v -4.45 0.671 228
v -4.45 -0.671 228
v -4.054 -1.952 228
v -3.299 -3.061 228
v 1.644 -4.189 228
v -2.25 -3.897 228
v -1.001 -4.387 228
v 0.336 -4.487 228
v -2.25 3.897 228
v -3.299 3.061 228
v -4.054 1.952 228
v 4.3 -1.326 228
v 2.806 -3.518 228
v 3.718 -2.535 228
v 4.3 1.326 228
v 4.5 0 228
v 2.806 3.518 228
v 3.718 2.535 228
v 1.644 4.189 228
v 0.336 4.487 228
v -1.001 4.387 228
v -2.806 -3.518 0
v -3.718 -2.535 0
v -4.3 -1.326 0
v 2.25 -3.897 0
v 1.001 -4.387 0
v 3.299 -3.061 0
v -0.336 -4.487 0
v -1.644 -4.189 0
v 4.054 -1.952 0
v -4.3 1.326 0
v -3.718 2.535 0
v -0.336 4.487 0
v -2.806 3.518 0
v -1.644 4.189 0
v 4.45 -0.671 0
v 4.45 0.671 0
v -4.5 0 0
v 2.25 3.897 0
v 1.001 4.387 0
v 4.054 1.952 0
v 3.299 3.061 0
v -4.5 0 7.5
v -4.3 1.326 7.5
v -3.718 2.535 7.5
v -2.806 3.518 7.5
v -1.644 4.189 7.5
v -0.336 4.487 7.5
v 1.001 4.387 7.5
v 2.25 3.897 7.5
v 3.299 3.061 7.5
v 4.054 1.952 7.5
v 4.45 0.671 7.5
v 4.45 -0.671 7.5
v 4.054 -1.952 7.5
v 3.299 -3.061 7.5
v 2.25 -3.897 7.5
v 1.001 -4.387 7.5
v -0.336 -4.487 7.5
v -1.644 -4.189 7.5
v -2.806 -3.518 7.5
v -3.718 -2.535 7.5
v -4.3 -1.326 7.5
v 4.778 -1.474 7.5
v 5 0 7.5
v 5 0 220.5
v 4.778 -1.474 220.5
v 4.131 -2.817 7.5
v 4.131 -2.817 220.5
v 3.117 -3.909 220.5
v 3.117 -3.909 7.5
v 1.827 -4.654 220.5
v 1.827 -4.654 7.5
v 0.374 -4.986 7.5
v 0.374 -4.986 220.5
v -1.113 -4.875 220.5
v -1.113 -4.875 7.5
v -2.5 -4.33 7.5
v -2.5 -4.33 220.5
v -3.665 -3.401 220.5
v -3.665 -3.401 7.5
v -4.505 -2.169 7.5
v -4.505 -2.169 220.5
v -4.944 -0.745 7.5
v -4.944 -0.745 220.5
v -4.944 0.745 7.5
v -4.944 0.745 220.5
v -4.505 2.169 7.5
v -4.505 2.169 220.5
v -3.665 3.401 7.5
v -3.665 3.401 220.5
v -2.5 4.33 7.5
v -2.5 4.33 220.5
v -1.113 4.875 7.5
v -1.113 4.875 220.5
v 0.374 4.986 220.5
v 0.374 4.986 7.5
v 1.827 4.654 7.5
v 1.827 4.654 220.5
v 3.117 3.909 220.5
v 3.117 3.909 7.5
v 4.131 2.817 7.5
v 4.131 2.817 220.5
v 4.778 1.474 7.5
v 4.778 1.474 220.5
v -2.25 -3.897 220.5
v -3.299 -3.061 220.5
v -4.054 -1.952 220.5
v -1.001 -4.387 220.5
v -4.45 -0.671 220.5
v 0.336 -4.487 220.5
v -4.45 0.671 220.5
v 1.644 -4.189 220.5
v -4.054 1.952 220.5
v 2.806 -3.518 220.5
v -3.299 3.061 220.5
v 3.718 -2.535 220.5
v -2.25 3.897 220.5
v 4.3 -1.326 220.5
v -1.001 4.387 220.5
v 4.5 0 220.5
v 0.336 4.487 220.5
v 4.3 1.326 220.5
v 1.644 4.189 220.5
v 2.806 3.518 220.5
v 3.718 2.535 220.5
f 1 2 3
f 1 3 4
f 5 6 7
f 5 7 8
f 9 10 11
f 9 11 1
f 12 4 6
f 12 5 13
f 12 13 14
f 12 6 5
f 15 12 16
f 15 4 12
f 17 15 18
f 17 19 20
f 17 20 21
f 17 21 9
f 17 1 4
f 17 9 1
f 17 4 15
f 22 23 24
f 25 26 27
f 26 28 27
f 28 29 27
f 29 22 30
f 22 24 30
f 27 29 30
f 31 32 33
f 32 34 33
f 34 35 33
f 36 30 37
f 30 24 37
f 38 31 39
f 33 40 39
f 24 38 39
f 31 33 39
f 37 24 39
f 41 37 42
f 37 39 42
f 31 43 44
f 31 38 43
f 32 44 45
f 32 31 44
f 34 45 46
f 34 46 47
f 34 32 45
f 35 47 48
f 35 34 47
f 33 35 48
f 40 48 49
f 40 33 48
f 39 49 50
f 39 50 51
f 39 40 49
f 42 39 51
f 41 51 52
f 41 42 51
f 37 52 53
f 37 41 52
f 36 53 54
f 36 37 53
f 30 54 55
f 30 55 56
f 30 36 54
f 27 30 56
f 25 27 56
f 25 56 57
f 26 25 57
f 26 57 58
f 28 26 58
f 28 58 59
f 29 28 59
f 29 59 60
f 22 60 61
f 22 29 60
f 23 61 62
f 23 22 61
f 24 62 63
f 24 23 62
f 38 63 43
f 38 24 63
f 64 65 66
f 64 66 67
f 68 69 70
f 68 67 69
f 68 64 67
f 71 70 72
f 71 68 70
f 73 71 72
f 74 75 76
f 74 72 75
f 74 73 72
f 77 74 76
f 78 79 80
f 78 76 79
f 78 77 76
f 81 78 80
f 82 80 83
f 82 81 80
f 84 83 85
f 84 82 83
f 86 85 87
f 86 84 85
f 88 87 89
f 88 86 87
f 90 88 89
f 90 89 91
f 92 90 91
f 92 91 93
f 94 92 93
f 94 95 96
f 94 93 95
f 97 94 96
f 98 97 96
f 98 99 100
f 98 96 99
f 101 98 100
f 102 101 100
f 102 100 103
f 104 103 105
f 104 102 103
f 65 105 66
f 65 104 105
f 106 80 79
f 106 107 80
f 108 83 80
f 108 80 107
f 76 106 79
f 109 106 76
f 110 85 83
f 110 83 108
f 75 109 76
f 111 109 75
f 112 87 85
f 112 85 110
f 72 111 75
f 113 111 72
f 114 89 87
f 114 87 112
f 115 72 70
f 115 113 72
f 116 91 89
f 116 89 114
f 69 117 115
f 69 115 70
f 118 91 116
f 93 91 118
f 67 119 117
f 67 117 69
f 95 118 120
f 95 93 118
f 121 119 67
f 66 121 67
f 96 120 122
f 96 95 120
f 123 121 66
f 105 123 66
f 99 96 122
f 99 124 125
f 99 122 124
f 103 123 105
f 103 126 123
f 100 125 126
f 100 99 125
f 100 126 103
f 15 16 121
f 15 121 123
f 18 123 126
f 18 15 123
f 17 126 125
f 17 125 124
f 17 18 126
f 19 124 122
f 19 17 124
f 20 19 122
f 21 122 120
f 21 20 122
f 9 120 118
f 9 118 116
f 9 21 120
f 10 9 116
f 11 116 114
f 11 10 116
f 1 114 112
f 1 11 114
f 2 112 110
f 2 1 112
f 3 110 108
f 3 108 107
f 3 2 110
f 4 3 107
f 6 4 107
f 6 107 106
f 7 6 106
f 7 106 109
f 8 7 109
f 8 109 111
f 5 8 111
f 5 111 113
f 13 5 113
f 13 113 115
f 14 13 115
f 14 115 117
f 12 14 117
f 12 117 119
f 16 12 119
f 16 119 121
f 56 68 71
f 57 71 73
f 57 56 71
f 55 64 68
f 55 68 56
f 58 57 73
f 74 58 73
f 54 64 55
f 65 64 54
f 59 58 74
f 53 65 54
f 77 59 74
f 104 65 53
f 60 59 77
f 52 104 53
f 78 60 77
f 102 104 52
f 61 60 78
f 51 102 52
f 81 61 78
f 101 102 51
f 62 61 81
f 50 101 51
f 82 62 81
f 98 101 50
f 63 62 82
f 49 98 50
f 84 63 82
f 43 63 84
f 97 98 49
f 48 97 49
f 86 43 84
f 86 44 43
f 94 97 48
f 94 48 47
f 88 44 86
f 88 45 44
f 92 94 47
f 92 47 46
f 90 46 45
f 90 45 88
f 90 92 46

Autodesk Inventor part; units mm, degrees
ref_plane "YZ Plane" through (0, 0, 0) normal (1, 0, 0) x (0, 1, 0)
ref_plane "XZ Plane" through (0, 0, 0) normal (0, 1, 0) x (-1, 0, 0)
ref_plane "XY Plane" through (0, 0, 0) normal (0, 0, 1) x (1, 0, 0)
sketch "Sketch2" plane through (0, 0, 0) normal (0, 0, 1) x (1, 0, 0)
  circle A0 centre (0, 0) radius 5
  dimension "d7" = 10
extrude "Extrusion2" add sketch "Sketch2" along normal blind 228
sketch "Sketch3" plane through (0, 0, 228) normal (0, 0, 1) x (1, 0, 0)
  circle A0 centre (0, 0) radius 4.5
  circle A1 centre (0, 0) radius 5
  dimension "d10" = 9
extrude "Extrusion3" cut sketch "Sketch3" against normal blind 7.5
sketch "Sketch4" plane through (0, 0, 0) normal (0, 0, -1) x (-1, 0, 0)
  circle A0 centre (0, 0) radius 4.5
  circle A1 centre (0, 0) radius 5
  dimension "d13" = 9
  dimension "d14" = 10
extrude "Extrusion4" cut sketch "Sketch4" against normal blind 7.5
equation "\"BendRadius\" = Thickness"
equation "\"BendReliefWidth\" = Thickness"
equation "\"BendReliefDepth\" = 0.5 * Thickness"
equation "\"CornerReliefSize\" = 4 * Thickness"
equation "\"MinimumRemnant\" = 2 * Thickness"
equation "\"TransitionRadius\" = BendRadius"
equation "\"JacobiRadiusSize\" = BendRadius"
equation "\"GapSize\" = Thickness"
equation "\"Thickness\" = 0.5"
properties part number "link2"
